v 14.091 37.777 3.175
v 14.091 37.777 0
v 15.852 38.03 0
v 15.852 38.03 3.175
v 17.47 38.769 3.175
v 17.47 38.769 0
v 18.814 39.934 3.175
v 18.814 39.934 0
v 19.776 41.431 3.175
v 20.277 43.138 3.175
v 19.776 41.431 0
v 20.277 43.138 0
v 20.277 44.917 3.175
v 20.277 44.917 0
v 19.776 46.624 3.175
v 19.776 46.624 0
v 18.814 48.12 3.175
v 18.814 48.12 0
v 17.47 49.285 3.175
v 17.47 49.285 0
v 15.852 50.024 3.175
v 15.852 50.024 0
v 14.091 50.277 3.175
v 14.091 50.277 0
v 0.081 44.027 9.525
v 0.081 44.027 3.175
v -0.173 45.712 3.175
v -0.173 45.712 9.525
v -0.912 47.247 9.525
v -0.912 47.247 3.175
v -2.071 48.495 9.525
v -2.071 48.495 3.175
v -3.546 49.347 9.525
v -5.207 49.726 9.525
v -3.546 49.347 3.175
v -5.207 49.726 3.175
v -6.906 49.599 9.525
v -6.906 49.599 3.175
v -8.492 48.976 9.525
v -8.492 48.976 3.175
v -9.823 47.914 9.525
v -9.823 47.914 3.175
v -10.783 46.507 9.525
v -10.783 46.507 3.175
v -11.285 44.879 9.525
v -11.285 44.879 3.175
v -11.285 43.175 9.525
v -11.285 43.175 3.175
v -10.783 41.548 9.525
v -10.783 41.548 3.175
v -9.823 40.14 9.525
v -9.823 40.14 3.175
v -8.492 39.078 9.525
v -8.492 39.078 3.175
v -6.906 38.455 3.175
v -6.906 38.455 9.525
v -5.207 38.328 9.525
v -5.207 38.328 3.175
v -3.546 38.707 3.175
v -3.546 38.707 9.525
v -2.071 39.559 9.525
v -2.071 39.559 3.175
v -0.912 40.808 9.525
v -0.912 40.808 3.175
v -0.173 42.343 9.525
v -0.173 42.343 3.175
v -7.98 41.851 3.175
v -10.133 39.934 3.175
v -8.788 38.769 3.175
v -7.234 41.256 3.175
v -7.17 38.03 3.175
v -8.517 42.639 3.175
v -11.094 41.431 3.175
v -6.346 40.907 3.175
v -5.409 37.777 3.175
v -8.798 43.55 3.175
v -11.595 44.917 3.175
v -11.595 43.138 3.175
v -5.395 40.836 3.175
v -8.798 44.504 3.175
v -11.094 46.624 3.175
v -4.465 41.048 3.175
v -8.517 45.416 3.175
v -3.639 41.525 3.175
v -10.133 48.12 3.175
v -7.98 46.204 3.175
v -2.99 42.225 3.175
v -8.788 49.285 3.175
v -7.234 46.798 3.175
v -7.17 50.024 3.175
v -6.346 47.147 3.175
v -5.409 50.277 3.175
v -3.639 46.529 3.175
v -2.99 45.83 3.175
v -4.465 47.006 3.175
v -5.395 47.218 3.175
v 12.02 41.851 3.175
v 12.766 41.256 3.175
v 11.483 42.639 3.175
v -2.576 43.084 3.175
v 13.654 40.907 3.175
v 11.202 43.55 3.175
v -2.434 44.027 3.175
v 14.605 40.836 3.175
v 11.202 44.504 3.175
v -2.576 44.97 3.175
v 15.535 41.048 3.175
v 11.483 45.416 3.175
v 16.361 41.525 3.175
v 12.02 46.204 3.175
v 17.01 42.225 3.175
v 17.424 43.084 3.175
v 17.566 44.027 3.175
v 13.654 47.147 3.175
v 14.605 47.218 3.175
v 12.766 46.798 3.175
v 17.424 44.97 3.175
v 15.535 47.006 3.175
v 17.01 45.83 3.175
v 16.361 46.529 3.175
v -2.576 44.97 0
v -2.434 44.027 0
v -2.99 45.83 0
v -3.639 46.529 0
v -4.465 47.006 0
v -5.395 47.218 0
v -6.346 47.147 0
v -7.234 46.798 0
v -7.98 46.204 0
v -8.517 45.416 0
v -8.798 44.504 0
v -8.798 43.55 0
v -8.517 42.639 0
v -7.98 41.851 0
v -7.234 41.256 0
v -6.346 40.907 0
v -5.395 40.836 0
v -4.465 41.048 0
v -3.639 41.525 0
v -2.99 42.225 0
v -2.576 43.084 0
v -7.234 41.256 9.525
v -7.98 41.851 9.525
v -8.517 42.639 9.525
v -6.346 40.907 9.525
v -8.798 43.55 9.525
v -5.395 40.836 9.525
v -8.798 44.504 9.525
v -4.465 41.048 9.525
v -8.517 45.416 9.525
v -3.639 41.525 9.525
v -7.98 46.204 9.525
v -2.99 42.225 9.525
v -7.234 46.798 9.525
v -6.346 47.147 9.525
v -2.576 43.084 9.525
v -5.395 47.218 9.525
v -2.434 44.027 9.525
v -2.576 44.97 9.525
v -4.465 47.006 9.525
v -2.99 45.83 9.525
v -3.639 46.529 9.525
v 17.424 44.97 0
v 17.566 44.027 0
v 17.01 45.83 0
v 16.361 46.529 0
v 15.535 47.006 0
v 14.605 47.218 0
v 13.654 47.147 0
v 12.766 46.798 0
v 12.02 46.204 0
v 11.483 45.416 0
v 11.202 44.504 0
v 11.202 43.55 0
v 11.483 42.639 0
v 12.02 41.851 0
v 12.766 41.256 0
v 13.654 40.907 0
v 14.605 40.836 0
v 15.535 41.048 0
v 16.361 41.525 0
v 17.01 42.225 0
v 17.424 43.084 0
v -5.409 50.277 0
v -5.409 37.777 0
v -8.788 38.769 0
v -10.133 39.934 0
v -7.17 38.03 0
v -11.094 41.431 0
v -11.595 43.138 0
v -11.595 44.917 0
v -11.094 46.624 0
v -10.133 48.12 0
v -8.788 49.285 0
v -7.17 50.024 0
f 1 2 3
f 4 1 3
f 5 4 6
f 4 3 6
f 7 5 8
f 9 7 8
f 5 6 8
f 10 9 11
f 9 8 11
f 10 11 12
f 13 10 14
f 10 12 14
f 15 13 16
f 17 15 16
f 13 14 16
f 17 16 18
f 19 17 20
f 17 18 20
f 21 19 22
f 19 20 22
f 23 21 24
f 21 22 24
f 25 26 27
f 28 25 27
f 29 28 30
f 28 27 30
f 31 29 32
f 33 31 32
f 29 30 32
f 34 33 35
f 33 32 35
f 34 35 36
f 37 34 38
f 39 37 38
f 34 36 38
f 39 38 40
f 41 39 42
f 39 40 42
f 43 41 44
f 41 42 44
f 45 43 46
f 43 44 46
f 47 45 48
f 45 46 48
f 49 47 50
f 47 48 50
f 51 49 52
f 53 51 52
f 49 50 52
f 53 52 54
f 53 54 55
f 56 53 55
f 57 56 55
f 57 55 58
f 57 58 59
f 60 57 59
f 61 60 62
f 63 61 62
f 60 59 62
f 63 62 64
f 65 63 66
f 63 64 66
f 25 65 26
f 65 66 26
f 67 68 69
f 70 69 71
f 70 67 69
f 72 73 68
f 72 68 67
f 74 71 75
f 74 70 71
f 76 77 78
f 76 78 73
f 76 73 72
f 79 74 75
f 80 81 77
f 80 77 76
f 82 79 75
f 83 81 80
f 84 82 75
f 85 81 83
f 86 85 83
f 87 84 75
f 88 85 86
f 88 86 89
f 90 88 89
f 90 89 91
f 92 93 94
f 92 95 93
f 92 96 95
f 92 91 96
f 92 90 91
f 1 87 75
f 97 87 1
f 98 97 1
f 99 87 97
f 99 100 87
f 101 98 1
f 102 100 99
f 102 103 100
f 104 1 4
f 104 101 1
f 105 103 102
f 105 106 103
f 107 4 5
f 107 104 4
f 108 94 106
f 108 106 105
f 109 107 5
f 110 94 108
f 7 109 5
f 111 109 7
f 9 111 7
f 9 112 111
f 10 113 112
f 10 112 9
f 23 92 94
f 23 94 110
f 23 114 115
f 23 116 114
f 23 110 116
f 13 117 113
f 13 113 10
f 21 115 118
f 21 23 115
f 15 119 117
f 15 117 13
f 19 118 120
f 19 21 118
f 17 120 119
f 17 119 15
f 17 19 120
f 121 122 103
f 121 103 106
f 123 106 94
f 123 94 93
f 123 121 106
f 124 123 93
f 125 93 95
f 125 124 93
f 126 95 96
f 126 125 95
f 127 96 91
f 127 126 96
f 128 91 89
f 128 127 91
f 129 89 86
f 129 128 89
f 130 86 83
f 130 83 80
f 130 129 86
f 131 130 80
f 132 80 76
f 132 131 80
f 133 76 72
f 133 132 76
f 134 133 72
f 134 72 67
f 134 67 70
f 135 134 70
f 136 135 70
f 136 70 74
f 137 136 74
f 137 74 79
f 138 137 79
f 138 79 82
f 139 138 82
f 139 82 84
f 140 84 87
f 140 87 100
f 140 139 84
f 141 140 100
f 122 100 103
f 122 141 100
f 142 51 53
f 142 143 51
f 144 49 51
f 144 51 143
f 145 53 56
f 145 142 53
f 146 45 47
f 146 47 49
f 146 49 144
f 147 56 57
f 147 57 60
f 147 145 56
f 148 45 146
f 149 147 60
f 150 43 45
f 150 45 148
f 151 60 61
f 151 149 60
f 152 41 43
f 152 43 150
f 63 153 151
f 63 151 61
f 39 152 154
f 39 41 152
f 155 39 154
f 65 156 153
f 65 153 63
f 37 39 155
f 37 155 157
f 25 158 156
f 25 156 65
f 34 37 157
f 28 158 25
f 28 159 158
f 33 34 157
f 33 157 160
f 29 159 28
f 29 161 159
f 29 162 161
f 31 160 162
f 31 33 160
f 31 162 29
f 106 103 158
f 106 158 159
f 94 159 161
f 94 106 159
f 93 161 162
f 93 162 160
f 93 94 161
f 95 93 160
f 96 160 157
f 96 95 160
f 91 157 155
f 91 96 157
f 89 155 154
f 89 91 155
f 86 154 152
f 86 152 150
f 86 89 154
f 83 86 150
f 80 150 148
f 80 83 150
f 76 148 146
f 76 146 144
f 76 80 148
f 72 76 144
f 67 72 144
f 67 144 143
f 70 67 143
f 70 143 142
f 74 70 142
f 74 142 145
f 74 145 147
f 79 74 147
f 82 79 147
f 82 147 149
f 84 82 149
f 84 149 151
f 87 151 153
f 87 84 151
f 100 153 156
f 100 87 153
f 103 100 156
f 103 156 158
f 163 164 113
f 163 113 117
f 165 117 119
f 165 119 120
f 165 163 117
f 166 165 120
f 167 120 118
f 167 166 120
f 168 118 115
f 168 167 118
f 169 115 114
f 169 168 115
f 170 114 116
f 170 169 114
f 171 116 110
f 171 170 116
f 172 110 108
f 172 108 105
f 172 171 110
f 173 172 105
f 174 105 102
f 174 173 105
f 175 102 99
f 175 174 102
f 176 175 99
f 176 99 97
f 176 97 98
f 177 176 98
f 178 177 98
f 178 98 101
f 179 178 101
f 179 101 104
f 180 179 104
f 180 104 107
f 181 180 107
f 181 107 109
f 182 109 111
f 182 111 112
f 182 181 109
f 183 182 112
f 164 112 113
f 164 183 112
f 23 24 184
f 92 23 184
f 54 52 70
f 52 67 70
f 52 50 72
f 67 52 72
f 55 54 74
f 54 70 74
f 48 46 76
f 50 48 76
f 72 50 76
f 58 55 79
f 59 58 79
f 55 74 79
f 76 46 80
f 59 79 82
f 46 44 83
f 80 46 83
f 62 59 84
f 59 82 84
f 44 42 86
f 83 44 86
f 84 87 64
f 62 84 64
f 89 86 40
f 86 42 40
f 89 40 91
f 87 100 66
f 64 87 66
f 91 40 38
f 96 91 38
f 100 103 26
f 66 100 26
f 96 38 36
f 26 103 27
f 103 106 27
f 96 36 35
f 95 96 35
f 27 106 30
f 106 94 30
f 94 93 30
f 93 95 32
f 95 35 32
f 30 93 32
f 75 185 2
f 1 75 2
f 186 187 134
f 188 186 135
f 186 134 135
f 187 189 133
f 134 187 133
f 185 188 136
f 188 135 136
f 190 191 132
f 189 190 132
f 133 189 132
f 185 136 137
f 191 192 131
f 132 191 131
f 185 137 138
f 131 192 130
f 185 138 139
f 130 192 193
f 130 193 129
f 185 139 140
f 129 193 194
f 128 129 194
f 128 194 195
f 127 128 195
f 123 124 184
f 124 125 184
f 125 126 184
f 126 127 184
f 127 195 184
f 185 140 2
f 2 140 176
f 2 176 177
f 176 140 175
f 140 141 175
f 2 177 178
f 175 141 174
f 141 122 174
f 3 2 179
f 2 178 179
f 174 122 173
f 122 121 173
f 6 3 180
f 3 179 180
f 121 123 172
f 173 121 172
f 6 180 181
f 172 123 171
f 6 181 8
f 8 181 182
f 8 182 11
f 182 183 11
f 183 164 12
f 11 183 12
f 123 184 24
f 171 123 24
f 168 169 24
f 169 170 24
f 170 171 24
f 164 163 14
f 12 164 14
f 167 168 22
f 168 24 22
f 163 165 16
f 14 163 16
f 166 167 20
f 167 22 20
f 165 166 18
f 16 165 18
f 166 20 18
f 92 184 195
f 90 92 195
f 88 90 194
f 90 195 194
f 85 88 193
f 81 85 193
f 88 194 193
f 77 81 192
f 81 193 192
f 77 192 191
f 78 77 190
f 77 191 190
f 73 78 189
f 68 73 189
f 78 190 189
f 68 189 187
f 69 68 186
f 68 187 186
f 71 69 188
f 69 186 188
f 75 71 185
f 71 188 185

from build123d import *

# Parameters (mm, degrees)
F0_R     = 3.2
F1_DEPTH = 3.175
F2_R     = 5.715
F2_R_2   = 3.2
F3_DEPTH = 6.35


# Not quite as in the source:
# - a length typed as a fraction of an inch, garbled in the dataset ("3 / 203.2 mm" for 3/8 in), is restored


with BuildPart() as f1:
    # F0 (on Top) → F1 (new body)
    with BuildSketch(Plane.XY):
        with BuildLine():
            ThreePointArc((-5.4090924263, 50.2771637037), (-11.6590924263, 44.0271637037), (-5.4090924263, 37.7771637037))
            Line((-5.4090924263, 37.7771637037), (14.0909075737, 37.7771637037))
            ThreePointArc((14.0909075737, 37.7771637037), (20.3409075737, 44.0271637037), (14.0909075737, 50.2771637037))
            Line((14.0909075737, 50.2771637037), (-5.4090924263, 50.2771637037))
        make_face()
        with Locations((-5.6340924263, 44.0271637037)):
            Circle(F0_R, mode=Mode.SUBTRACT)
        with Locations((14.3659075737, 44.0271637037)):
            Circle(F0_R, mode=Mode.SUBTRACT)
    extrude(amount=F1_DEPTH)


with BuildPart() as f3:
    # F2 (on face) → F3 (new body)
    with BuildSketch(Plane.XY.offset(3.175)):
        with Locations((-5.6340924263, 44.0271637037)):
            Circle(F2_R)
        with Locations((-5.6340924263, 44.0271637037)):
            Circle(F2_R_2, mode=Mode.SUBTRACT)
    extrude(amount=F3_DEPTH)


solid = Compound([f1.part, f3.part])
